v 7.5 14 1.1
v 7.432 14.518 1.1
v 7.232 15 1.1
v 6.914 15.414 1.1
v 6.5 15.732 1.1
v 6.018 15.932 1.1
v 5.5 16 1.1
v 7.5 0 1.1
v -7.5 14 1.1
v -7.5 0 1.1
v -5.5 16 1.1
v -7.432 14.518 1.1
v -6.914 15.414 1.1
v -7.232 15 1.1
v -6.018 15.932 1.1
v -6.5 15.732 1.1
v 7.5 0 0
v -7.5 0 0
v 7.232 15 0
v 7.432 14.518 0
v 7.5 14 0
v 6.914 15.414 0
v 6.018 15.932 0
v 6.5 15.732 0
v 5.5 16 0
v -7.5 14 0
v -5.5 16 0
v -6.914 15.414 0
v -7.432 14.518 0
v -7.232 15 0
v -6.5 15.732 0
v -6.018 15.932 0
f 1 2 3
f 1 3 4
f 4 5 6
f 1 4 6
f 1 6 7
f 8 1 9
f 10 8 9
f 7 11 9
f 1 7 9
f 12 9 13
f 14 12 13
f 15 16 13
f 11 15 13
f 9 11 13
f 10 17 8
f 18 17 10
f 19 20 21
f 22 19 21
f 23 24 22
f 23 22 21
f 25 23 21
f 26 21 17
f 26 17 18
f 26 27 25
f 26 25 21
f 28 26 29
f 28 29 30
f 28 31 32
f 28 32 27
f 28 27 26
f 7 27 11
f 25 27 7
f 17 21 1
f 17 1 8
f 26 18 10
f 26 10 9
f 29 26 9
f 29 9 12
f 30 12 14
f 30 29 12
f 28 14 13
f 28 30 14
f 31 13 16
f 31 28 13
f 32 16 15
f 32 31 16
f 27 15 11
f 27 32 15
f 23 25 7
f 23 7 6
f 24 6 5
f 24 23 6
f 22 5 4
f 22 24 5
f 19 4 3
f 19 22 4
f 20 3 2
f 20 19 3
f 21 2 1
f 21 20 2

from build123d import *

# Parameters (mm, degrees)
EXTRUDE_1_DEPTH = 1.1


with BuildPart() as part:
    # 草图1 → 凸台-拉伸1 (new body)
    with BuildSketch(Plane.XY):
        with BuildLine():
            Line((0, 16), (5.5, 16))
            ThreePointArc((5.5, 16), (6.914213562, 15.414213562), (7.5, 14))
            Line((7.5, 14), (7.5, 0))
            Line((7.5, 0), (0, 0))
            Line((0, 0), (-7.5, 0))
            Line((-7.5, 0), (-7.5, 14))
            ThreePointArc((-7.5, 14), (-6.914213562, 15.414213562), (-5.5, 16))
            Line((-5.5, 16), (0, 16))
        make_face()
    extrude(amount=EXTRUDE_1_DEPTH)


solid = part.part
